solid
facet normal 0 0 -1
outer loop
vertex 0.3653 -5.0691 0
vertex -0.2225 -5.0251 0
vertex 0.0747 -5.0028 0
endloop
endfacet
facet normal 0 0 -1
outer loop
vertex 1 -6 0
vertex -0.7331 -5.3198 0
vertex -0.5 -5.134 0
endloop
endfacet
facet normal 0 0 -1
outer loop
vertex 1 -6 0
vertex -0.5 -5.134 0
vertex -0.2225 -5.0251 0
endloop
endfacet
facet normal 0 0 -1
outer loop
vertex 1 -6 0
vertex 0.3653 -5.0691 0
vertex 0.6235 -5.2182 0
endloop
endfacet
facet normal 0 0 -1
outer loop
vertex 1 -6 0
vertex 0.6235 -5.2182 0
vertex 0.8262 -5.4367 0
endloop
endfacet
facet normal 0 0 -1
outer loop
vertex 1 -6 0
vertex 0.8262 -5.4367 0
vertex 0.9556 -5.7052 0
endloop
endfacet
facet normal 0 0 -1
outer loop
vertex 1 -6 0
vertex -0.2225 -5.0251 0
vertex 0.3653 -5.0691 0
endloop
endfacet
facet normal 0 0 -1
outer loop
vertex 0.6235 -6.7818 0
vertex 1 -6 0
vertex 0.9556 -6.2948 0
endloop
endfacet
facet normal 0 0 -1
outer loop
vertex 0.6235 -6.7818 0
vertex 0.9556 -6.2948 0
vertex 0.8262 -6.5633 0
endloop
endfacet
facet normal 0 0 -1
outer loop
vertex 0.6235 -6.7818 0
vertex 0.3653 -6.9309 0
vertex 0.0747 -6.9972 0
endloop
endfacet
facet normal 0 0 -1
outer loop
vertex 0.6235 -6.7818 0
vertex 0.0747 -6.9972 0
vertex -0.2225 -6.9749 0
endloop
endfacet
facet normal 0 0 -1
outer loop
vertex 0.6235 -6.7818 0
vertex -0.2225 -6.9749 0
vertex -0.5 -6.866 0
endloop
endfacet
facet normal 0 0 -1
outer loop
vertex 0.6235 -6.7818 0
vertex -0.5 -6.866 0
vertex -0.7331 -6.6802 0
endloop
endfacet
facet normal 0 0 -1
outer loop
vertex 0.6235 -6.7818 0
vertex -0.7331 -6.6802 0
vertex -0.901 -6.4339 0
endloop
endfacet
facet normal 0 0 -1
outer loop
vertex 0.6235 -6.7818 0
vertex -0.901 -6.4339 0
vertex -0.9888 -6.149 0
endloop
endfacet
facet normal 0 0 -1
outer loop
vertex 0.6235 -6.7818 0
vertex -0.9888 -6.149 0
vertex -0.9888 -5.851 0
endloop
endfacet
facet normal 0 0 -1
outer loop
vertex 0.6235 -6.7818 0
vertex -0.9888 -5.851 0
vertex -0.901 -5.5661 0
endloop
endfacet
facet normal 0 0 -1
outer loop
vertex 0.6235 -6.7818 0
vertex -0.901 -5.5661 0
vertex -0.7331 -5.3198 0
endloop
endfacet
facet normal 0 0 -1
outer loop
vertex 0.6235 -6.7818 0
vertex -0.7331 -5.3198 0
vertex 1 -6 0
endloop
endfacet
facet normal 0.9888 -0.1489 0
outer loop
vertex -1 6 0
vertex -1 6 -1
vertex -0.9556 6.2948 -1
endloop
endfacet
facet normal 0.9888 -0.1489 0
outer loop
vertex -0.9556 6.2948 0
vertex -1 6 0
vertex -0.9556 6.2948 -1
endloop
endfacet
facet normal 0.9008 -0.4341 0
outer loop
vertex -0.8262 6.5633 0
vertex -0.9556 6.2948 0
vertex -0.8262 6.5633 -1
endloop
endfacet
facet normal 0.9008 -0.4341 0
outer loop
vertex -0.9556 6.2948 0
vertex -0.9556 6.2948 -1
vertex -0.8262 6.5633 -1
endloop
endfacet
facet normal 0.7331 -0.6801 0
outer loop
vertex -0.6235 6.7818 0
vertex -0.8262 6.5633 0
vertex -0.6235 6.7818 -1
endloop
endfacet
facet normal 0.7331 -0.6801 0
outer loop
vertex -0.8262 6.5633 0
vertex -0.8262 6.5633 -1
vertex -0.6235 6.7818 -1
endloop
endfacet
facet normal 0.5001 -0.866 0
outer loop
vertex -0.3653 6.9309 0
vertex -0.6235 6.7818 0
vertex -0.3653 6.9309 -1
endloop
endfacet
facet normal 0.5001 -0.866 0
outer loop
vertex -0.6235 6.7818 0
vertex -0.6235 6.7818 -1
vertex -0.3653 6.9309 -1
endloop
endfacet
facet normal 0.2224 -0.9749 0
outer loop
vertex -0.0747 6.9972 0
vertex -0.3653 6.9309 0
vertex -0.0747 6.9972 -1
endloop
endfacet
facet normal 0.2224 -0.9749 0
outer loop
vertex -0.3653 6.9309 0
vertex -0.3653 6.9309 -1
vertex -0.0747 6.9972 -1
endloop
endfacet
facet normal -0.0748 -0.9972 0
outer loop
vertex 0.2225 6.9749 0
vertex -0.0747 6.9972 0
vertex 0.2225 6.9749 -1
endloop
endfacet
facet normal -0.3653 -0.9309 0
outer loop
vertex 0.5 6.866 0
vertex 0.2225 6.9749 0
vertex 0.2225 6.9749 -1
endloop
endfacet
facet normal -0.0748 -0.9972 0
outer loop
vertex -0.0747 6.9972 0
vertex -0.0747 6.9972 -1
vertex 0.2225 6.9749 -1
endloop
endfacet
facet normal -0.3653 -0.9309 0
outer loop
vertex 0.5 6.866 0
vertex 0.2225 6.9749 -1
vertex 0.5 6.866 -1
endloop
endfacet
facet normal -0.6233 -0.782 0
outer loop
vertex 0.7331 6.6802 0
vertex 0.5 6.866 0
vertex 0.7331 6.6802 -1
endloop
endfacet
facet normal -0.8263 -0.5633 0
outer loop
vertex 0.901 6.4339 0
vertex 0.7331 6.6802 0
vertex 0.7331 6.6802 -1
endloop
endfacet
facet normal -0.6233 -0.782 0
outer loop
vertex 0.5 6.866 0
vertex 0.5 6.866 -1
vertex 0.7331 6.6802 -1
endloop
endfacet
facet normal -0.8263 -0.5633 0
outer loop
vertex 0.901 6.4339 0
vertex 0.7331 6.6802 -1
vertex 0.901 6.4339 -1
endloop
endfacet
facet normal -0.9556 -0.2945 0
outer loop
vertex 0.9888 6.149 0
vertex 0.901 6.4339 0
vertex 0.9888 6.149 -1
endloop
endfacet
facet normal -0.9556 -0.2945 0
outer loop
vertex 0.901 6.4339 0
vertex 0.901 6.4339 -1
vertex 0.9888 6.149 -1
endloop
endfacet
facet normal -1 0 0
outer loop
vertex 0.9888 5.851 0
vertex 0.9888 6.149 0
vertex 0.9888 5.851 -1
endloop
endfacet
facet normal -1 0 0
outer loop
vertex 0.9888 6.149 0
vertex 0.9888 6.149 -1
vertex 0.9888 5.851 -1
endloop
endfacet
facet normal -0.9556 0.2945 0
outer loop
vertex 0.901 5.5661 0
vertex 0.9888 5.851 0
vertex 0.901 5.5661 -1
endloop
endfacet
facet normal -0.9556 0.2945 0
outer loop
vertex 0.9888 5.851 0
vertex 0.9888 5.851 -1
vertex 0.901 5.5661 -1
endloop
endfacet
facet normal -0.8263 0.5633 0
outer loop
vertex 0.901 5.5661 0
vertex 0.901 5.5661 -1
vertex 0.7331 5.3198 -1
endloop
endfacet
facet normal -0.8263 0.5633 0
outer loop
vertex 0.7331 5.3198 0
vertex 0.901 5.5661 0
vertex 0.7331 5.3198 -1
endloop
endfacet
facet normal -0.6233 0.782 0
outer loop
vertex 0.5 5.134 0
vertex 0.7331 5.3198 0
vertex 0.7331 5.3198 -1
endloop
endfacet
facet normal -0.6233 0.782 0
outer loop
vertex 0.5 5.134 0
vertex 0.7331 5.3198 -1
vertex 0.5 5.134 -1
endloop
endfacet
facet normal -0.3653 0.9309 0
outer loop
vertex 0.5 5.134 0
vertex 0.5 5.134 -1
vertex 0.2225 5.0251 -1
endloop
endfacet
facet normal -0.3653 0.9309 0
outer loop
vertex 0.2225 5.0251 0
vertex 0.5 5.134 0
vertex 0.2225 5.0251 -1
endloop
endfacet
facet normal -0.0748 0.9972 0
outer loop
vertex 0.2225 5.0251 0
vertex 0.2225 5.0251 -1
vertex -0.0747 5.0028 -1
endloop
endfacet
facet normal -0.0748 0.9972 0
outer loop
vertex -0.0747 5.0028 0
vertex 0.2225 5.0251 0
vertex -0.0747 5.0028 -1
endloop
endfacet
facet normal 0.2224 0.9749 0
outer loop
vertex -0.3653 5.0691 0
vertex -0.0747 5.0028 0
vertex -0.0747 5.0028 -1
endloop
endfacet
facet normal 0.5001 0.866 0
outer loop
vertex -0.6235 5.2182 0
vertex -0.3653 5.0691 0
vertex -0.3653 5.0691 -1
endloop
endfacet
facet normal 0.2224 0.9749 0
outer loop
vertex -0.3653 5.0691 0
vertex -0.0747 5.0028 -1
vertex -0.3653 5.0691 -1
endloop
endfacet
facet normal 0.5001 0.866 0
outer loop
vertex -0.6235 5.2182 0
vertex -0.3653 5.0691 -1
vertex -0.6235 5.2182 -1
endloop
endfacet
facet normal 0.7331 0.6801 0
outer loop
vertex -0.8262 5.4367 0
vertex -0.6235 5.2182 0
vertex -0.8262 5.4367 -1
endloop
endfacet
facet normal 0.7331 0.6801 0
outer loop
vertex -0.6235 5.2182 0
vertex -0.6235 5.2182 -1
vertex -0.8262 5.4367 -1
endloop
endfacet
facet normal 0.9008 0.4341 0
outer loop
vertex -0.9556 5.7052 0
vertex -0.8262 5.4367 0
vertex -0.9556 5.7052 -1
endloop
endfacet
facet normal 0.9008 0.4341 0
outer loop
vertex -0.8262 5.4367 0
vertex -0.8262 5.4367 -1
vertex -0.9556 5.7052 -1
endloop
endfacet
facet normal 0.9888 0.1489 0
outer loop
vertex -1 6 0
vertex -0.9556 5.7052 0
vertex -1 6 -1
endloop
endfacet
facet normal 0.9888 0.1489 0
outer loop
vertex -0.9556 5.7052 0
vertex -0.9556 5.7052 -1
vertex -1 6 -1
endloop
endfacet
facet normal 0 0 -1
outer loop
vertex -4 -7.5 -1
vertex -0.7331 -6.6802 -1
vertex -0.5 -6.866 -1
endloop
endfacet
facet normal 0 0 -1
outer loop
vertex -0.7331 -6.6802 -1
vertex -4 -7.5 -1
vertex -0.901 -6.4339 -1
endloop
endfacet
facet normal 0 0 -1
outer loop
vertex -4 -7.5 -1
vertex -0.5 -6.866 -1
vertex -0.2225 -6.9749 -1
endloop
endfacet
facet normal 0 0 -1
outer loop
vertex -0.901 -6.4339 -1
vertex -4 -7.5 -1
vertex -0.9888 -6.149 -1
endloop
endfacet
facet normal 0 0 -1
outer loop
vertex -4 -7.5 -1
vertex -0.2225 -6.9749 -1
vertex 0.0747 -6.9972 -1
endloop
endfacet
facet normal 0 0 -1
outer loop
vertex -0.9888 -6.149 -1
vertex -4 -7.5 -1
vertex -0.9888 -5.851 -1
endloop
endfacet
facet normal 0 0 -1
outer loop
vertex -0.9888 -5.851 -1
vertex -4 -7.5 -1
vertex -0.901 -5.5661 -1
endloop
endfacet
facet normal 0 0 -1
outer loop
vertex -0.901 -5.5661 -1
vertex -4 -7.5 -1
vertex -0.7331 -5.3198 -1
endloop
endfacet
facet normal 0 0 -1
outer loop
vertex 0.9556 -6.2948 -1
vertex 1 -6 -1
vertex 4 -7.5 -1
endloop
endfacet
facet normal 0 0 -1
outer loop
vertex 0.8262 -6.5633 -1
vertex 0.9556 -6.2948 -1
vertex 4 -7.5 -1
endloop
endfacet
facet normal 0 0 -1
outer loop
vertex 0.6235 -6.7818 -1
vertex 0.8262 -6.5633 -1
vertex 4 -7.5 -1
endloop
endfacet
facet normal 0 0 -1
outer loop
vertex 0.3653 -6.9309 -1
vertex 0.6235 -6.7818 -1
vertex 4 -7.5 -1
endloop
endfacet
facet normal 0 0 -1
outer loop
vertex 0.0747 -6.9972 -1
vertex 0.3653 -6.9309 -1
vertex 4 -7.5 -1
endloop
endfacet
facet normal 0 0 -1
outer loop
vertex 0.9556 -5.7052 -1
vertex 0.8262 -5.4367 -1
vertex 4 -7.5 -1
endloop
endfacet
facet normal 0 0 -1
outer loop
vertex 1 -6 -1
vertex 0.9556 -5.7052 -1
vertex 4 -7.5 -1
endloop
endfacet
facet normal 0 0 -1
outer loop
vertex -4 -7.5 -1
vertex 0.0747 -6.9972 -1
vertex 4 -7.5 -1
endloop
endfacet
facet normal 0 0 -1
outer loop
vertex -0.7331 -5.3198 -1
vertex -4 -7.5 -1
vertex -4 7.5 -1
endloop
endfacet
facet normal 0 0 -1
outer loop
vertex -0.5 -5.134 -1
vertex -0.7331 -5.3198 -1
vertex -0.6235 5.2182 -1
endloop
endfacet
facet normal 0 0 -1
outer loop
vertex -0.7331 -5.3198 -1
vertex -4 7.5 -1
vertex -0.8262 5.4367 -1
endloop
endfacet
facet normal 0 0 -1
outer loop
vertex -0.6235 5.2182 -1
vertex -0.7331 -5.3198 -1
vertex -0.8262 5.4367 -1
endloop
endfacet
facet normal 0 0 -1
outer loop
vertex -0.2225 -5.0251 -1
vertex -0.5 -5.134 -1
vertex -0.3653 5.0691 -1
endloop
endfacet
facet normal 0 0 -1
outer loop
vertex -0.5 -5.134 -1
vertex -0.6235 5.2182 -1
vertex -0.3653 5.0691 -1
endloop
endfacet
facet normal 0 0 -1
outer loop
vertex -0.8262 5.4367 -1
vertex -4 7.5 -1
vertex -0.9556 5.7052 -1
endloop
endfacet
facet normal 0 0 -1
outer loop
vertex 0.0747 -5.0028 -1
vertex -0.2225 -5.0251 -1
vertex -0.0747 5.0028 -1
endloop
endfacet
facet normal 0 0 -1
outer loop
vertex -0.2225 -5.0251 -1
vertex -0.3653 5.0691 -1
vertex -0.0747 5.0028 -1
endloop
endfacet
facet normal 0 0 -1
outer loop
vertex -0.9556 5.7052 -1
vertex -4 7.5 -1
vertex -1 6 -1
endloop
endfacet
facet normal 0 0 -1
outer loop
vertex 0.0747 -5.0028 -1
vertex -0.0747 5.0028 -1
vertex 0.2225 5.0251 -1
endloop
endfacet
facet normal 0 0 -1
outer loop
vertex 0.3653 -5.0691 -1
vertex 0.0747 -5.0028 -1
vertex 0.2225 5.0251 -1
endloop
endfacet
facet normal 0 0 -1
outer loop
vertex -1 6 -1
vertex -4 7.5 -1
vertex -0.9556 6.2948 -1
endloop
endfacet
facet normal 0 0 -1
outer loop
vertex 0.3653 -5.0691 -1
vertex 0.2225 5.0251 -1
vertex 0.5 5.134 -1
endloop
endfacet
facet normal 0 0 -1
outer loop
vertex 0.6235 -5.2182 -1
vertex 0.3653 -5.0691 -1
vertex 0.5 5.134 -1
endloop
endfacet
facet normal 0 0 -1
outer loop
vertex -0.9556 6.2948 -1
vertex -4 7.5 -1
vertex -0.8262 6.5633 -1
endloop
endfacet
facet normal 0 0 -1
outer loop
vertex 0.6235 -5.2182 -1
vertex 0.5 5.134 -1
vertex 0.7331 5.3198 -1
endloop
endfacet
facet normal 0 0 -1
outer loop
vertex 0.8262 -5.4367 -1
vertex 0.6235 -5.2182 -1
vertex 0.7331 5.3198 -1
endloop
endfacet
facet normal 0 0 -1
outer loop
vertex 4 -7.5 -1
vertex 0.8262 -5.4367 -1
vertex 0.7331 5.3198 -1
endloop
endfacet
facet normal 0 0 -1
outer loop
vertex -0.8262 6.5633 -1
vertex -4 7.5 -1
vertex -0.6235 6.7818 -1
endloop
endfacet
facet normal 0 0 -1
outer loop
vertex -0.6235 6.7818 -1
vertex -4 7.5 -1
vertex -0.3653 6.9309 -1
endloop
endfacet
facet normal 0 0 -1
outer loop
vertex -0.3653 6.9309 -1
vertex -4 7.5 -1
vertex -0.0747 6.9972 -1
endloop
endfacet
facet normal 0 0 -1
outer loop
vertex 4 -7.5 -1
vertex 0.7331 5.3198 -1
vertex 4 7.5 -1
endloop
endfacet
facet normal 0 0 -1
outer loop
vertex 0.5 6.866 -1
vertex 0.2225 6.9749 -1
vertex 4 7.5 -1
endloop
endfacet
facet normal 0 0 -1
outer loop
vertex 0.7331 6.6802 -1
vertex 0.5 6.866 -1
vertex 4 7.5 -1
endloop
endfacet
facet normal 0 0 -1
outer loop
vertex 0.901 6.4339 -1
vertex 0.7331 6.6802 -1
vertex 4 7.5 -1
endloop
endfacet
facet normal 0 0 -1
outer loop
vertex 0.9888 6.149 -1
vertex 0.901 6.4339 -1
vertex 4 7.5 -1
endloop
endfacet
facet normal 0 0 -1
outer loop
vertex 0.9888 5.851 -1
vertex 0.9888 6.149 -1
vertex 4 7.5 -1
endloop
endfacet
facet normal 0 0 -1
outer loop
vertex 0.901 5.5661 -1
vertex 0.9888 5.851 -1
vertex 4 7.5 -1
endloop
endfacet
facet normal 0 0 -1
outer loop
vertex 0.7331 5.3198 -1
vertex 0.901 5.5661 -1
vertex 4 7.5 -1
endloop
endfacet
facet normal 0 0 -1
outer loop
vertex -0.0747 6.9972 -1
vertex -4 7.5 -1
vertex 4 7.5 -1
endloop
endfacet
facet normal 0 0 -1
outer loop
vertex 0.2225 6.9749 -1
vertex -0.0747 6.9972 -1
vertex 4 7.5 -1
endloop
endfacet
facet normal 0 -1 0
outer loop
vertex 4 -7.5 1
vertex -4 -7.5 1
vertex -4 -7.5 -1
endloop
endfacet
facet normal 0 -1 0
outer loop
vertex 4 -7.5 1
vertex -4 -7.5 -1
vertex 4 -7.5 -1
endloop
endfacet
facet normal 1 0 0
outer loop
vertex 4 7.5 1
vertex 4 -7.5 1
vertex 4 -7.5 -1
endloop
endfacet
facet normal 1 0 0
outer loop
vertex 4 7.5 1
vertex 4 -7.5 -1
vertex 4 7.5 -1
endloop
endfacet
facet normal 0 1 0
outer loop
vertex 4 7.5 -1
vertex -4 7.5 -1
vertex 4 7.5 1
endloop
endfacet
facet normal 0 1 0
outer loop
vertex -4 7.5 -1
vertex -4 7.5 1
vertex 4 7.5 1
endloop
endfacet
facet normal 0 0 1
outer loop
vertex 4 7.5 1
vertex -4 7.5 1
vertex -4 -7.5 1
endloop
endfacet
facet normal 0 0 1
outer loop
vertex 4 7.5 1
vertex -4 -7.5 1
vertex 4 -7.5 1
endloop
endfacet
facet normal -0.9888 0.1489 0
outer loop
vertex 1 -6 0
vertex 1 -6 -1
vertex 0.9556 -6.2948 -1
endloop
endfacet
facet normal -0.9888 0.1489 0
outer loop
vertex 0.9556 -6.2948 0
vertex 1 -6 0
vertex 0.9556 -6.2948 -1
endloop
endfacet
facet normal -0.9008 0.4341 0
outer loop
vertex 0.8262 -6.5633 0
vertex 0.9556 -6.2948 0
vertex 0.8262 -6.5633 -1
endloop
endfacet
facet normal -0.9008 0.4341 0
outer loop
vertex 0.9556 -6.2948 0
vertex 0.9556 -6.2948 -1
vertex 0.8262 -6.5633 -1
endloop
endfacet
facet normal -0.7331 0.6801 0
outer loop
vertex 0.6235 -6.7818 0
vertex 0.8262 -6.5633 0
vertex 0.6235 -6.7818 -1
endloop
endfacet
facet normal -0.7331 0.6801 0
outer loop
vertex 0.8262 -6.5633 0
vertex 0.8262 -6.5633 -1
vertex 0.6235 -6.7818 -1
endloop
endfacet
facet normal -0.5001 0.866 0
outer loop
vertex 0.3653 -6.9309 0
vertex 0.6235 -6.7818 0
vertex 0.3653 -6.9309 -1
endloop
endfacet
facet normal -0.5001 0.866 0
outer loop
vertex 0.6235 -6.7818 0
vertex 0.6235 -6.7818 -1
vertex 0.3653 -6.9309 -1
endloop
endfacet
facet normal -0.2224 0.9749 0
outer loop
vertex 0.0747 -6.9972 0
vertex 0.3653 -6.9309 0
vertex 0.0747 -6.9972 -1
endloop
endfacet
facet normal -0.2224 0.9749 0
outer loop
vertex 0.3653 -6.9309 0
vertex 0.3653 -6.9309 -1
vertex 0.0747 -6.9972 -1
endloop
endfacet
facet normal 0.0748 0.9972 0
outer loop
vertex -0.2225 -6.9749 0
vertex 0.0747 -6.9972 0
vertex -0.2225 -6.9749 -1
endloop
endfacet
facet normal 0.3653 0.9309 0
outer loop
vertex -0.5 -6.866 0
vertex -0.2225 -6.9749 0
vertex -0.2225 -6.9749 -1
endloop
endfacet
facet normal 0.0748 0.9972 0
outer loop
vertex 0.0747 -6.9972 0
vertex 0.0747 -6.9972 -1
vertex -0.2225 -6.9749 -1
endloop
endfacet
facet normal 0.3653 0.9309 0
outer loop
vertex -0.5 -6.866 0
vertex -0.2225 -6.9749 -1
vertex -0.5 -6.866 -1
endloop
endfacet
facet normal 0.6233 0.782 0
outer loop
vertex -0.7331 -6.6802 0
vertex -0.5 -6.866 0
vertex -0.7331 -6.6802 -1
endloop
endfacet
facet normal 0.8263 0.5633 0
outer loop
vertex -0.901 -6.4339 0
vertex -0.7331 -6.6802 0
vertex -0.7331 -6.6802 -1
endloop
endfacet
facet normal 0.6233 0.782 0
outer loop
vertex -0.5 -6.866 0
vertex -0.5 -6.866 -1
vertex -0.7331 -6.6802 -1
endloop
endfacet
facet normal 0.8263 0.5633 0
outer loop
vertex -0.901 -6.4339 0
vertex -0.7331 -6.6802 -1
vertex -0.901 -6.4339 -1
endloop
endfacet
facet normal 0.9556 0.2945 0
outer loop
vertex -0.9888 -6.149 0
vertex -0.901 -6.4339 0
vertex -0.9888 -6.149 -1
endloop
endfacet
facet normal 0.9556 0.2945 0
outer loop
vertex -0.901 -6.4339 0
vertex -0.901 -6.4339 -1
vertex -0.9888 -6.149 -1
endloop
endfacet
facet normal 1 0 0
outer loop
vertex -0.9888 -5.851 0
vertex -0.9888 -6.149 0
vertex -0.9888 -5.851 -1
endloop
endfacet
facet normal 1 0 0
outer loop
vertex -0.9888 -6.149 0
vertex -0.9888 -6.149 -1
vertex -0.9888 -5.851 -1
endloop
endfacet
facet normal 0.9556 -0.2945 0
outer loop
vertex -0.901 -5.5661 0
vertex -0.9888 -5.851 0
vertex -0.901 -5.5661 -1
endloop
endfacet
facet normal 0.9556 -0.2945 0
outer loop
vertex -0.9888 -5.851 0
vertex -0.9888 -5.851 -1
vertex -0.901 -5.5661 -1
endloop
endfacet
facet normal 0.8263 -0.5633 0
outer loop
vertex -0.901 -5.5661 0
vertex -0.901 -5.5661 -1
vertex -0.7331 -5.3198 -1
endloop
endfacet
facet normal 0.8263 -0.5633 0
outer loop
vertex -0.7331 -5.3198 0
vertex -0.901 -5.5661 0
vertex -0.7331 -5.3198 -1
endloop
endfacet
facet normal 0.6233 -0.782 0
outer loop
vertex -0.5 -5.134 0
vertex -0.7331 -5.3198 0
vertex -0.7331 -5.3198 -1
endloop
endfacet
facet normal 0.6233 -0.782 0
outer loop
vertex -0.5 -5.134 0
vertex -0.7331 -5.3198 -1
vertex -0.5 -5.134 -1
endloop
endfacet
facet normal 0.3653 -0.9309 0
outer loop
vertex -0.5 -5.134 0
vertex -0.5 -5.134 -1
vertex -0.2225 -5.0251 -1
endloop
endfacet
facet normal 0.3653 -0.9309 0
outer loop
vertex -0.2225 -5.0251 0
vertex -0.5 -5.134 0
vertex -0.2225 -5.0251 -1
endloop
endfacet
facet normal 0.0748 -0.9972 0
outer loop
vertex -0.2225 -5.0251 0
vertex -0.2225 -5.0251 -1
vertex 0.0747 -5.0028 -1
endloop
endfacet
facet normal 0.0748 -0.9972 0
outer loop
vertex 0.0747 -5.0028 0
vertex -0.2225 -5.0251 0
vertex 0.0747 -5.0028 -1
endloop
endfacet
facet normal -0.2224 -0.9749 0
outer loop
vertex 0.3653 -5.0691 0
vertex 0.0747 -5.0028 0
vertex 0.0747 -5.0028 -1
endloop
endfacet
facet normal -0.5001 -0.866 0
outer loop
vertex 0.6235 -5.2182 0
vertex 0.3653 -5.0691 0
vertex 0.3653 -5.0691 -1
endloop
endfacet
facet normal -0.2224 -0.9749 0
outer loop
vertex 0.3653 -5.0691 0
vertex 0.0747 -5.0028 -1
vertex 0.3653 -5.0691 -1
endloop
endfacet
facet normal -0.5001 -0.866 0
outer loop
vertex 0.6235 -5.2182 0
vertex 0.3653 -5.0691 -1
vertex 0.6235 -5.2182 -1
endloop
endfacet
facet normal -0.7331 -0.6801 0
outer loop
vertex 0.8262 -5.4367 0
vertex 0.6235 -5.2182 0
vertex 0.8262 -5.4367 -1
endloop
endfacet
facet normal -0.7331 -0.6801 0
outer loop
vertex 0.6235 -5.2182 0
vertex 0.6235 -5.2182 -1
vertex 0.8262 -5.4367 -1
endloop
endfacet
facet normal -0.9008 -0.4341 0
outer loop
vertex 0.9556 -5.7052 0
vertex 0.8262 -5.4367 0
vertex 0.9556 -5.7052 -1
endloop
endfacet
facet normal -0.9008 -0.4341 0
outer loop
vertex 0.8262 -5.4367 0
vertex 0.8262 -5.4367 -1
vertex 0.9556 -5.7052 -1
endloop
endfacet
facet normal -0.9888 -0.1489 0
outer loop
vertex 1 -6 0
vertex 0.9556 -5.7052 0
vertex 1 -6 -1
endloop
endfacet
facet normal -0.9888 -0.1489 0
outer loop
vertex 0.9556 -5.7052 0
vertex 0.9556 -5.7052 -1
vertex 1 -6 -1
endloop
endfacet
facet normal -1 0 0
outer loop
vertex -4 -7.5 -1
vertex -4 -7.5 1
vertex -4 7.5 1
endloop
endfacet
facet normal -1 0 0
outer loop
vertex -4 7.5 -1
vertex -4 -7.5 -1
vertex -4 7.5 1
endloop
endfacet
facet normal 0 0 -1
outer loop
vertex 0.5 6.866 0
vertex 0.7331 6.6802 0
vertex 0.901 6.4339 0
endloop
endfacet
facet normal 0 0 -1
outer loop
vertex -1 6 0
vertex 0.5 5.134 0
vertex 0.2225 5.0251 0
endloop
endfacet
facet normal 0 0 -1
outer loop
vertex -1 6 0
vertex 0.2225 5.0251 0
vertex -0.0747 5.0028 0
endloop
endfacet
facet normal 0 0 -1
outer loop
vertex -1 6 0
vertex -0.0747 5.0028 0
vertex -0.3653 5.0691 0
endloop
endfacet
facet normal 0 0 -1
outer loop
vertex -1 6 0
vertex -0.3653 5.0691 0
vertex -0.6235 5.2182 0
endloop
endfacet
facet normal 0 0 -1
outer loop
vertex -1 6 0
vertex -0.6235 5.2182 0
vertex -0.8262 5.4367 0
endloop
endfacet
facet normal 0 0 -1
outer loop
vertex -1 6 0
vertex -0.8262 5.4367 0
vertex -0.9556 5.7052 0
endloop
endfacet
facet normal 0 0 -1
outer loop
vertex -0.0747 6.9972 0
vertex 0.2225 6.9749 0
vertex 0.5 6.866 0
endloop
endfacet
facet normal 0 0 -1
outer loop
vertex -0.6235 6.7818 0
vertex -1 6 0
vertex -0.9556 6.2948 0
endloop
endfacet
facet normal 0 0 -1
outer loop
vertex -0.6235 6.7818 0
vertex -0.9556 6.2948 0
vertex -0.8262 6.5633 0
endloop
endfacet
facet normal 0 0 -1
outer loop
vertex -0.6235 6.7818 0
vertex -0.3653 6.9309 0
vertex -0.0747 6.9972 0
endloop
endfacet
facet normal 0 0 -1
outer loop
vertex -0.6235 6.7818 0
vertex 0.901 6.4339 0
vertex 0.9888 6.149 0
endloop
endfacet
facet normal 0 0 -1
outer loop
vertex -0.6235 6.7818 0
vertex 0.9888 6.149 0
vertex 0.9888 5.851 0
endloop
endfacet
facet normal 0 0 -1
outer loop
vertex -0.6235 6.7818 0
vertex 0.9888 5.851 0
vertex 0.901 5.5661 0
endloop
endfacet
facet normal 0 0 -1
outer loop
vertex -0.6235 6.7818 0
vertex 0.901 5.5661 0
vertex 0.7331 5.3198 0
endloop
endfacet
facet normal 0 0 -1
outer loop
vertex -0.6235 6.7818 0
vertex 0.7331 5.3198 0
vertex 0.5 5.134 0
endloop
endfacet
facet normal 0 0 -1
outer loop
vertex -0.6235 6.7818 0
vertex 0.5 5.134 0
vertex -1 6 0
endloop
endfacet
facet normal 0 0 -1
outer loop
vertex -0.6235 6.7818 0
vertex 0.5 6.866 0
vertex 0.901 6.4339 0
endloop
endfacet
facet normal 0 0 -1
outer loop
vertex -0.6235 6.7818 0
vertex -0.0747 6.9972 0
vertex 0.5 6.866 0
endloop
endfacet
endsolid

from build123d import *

# Parameters (mm, degrees)
SKETCH1_W           = 8
SKETCH1_H           = 15
BOSS_EXTRUDE1_DEPTH = 1
SKETCH2_R           = 1
CUT_EXTRUDE1_DEPTH  = 1


with BuildPart() as part:
    # Sketch1 → Boss-Extrude1 (new, symmetric)
    with BuildSketch(Plane.XY):
        Rectangle(SKETCH1_W, SKETCH1_H)
    extrude(amount=BOSS_EXTRUDE1_DEPTH, both=True)

    # Sketch2 → Cut-Extrude1 (cut)
    with BuildSketch(Plane(origin=(0, 0, -1), x_dir=(-1, 0, 0), z_dir=(0, 0, -1))):
        with Locations((0, 6)):
            Circle(SKETCH2_R)
        with Locations(Location((0, -6, 0), (0, 0, 180))):
            Circle(SKETCH2_R)
    extrude(amount=-CUT_EXTRUDE1_DEPTH, mode=Mode.SUBTRACT)


solid = part.part
